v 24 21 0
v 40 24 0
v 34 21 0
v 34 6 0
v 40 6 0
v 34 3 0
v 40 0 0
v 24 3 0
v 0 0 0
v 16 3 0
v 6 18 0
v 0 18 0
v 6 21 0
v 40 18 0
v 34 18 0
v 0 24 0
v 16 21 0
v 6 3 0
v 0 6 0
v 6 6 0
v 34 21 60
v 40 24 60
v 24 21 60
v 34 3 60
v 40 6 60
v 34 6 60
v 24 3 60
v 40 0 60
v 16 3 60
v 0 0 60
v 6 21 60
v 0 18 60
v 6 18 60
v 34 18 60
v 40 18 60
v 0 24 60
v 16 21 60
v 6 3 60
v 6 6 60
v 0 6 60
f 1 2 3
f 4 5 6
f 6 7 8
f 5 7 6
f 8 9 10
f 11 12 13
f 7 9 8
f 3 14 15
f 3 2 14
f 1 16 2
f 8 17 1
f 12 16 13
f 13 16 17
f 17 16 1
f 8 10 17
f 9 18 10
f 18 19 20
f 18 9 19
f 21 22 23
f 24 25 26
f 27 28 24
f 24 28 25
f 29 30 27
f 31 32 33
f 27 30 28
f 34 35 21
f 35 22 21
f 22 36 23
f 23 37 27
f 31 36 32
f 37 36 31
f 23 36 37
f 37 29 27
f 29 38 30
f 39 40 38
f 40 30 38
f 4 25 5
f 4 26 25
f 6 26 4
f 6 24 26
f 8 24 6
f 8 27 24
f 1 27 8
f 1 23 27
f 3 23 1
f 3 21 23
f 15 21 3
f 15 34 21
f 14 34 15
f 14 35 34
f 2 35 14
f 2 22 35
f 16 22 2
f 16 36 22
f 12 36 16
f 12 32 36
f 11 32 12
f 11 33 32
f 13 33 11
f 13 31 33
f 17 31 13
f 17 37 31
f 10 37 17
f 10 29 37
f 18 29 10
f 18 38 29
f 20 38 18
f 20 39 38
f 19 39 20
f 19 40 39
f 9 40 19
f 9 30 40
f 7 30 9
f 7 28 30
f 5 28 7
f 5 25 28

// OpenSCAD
$fn = 32;

// ----------------------------------------------------------------------
// T-slot rail: 40 x 24 mm section, 60 mm long
// ----------------------------------------------------------------------

// --- parameters (mm) ---
profile_height = 60;      // extrusion height
profile_points = 20;      // points of the closed outline

profile = [[0, 0], [40, 0], [40, 6], [34, 6], [34, 3], [24, 3], [24, 21], [34, 21], [34, 18], [40, 18], [40, 24], [0, 24], [0, 18], [6, 18], [6, 21], [16, 21], [16, 3], [6, 3], [6, 6], [0, 6]];  // single closed polygon, 20 points, counter clockwise

// --- the one profile operation ---
linear_extrude(height = profile_height) polygon(points = profile);
